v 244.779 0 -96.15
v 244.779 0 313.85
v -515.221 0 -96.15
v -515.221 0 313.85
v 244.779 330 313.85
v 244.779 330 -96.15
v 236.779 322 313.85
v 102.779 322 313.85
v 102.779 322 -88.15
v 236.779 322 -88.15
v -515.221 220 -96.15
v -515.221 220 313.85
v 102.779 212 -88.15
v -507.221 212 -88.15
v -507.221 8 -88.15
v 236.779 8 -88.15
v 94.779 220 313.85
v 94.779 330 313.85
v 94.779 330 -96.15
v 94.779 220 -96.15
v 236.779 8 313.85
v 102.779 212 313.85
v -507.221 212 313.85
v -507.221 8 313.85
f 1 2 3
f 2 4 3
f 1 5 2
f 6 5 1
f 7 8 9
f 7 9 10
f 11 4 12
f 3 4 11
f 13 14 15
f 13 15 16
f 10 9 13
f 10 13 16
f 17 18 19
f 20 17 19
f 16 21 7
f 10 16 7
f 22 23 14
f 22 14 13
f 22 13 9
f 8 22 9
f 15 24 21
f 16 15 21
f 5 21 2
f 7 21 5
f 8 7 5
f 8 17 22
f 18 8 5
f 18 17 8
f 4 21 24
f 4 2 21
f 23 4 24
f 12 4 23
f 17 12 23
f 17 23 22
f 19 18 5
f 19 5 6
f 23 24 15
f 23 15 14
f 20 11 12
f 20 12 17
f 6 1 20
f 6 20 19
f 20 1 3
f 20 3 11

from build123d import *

# Parameters (mm, degrees)
SKETCH1_W           = 610
SKETCH1_H           = 410
BOSS_EXTRUDE1_DEPTH = 220
SKETCH2_W           = 410
SKETCH2_H           = 330
BOSS_EXTRUDE2_DEPTH = 150
SKETCH3_W           = 602
SKETCH3_H           = 204
CUT_EXTRUDE1_DEPTH  = 402
SKETCH5_W           = 142
SKETCH5_H           = 204
CUT_EXTRUDE2_DEPTH  = 402
SKETCH6_W           = 134
SKETCH6_H           = 110
CUT_EXTRUDE3_DEPTH  = 402


with BuildPart() as part:
    # Sketch1 → Boss-Extrude1 (new body)
    with BuildSketch(Plane(origin=(0, 0, 0), x_dir=(1, 0, 0), z_dir=(0, 1, 0))):
        with Locations((-210.221238938, -108.849557522)):
            Rectangle(SKETCH1_W, SKETCH1_H)
    extrude(amount=BOSS_EXTRUDE1_DEPTH)

    # Sketch2 → Boss-Extrude2 (add)
    with BuildSketch(Plane(origin=(94.778761062, 0, 0), x_dir=(0, 0, -1), z_dir=(1, 0, 0))):
        with Locations((-108.849557522, 165)):
            Rectangle(SKETCH2_W, SKETCH2_H)
    extrude(amount=BOSS_EXTRUDE2_DEPTH)

    # Sketch3 → Cut-Extrude1 (cut)
    with BuildSketch(Plane.XY.offset(313.849557522)):
        with Locations((-206.221238938, 110)):
            Rectangle(SKETCH3_W, SKETCH3_H)
    extrude(amount=-CUT_EXTRUDE1_DEPTH, mode=Mode.SUBTRACT)

    # Sketch5 → Cut-Extrude2 (cut)
    with BuildSketch(Plane.XY.offset(313.849557522)):
        with Locations((165.778761062, 110)):
            Rectangle(SKETCH5_W, SKETCH5_H)
    extrude(amount=-CUT_EXTRUDE2_DEPTH, mode=Mode.SUBTRACT)

    # Sketch6 → Cut-Extrude3 (cut)
    with BuildSketch(Plane.XY.offset(313.849557522)):
        with Locations((169.778761062, 267)):
            Rectangle(SKETCH6_W, SKETCH6_H)
    extrude(amount=-CUT_EXTRUDE3_DEPTH, mode=Mode.SUBTRACT)


solid = part.part
